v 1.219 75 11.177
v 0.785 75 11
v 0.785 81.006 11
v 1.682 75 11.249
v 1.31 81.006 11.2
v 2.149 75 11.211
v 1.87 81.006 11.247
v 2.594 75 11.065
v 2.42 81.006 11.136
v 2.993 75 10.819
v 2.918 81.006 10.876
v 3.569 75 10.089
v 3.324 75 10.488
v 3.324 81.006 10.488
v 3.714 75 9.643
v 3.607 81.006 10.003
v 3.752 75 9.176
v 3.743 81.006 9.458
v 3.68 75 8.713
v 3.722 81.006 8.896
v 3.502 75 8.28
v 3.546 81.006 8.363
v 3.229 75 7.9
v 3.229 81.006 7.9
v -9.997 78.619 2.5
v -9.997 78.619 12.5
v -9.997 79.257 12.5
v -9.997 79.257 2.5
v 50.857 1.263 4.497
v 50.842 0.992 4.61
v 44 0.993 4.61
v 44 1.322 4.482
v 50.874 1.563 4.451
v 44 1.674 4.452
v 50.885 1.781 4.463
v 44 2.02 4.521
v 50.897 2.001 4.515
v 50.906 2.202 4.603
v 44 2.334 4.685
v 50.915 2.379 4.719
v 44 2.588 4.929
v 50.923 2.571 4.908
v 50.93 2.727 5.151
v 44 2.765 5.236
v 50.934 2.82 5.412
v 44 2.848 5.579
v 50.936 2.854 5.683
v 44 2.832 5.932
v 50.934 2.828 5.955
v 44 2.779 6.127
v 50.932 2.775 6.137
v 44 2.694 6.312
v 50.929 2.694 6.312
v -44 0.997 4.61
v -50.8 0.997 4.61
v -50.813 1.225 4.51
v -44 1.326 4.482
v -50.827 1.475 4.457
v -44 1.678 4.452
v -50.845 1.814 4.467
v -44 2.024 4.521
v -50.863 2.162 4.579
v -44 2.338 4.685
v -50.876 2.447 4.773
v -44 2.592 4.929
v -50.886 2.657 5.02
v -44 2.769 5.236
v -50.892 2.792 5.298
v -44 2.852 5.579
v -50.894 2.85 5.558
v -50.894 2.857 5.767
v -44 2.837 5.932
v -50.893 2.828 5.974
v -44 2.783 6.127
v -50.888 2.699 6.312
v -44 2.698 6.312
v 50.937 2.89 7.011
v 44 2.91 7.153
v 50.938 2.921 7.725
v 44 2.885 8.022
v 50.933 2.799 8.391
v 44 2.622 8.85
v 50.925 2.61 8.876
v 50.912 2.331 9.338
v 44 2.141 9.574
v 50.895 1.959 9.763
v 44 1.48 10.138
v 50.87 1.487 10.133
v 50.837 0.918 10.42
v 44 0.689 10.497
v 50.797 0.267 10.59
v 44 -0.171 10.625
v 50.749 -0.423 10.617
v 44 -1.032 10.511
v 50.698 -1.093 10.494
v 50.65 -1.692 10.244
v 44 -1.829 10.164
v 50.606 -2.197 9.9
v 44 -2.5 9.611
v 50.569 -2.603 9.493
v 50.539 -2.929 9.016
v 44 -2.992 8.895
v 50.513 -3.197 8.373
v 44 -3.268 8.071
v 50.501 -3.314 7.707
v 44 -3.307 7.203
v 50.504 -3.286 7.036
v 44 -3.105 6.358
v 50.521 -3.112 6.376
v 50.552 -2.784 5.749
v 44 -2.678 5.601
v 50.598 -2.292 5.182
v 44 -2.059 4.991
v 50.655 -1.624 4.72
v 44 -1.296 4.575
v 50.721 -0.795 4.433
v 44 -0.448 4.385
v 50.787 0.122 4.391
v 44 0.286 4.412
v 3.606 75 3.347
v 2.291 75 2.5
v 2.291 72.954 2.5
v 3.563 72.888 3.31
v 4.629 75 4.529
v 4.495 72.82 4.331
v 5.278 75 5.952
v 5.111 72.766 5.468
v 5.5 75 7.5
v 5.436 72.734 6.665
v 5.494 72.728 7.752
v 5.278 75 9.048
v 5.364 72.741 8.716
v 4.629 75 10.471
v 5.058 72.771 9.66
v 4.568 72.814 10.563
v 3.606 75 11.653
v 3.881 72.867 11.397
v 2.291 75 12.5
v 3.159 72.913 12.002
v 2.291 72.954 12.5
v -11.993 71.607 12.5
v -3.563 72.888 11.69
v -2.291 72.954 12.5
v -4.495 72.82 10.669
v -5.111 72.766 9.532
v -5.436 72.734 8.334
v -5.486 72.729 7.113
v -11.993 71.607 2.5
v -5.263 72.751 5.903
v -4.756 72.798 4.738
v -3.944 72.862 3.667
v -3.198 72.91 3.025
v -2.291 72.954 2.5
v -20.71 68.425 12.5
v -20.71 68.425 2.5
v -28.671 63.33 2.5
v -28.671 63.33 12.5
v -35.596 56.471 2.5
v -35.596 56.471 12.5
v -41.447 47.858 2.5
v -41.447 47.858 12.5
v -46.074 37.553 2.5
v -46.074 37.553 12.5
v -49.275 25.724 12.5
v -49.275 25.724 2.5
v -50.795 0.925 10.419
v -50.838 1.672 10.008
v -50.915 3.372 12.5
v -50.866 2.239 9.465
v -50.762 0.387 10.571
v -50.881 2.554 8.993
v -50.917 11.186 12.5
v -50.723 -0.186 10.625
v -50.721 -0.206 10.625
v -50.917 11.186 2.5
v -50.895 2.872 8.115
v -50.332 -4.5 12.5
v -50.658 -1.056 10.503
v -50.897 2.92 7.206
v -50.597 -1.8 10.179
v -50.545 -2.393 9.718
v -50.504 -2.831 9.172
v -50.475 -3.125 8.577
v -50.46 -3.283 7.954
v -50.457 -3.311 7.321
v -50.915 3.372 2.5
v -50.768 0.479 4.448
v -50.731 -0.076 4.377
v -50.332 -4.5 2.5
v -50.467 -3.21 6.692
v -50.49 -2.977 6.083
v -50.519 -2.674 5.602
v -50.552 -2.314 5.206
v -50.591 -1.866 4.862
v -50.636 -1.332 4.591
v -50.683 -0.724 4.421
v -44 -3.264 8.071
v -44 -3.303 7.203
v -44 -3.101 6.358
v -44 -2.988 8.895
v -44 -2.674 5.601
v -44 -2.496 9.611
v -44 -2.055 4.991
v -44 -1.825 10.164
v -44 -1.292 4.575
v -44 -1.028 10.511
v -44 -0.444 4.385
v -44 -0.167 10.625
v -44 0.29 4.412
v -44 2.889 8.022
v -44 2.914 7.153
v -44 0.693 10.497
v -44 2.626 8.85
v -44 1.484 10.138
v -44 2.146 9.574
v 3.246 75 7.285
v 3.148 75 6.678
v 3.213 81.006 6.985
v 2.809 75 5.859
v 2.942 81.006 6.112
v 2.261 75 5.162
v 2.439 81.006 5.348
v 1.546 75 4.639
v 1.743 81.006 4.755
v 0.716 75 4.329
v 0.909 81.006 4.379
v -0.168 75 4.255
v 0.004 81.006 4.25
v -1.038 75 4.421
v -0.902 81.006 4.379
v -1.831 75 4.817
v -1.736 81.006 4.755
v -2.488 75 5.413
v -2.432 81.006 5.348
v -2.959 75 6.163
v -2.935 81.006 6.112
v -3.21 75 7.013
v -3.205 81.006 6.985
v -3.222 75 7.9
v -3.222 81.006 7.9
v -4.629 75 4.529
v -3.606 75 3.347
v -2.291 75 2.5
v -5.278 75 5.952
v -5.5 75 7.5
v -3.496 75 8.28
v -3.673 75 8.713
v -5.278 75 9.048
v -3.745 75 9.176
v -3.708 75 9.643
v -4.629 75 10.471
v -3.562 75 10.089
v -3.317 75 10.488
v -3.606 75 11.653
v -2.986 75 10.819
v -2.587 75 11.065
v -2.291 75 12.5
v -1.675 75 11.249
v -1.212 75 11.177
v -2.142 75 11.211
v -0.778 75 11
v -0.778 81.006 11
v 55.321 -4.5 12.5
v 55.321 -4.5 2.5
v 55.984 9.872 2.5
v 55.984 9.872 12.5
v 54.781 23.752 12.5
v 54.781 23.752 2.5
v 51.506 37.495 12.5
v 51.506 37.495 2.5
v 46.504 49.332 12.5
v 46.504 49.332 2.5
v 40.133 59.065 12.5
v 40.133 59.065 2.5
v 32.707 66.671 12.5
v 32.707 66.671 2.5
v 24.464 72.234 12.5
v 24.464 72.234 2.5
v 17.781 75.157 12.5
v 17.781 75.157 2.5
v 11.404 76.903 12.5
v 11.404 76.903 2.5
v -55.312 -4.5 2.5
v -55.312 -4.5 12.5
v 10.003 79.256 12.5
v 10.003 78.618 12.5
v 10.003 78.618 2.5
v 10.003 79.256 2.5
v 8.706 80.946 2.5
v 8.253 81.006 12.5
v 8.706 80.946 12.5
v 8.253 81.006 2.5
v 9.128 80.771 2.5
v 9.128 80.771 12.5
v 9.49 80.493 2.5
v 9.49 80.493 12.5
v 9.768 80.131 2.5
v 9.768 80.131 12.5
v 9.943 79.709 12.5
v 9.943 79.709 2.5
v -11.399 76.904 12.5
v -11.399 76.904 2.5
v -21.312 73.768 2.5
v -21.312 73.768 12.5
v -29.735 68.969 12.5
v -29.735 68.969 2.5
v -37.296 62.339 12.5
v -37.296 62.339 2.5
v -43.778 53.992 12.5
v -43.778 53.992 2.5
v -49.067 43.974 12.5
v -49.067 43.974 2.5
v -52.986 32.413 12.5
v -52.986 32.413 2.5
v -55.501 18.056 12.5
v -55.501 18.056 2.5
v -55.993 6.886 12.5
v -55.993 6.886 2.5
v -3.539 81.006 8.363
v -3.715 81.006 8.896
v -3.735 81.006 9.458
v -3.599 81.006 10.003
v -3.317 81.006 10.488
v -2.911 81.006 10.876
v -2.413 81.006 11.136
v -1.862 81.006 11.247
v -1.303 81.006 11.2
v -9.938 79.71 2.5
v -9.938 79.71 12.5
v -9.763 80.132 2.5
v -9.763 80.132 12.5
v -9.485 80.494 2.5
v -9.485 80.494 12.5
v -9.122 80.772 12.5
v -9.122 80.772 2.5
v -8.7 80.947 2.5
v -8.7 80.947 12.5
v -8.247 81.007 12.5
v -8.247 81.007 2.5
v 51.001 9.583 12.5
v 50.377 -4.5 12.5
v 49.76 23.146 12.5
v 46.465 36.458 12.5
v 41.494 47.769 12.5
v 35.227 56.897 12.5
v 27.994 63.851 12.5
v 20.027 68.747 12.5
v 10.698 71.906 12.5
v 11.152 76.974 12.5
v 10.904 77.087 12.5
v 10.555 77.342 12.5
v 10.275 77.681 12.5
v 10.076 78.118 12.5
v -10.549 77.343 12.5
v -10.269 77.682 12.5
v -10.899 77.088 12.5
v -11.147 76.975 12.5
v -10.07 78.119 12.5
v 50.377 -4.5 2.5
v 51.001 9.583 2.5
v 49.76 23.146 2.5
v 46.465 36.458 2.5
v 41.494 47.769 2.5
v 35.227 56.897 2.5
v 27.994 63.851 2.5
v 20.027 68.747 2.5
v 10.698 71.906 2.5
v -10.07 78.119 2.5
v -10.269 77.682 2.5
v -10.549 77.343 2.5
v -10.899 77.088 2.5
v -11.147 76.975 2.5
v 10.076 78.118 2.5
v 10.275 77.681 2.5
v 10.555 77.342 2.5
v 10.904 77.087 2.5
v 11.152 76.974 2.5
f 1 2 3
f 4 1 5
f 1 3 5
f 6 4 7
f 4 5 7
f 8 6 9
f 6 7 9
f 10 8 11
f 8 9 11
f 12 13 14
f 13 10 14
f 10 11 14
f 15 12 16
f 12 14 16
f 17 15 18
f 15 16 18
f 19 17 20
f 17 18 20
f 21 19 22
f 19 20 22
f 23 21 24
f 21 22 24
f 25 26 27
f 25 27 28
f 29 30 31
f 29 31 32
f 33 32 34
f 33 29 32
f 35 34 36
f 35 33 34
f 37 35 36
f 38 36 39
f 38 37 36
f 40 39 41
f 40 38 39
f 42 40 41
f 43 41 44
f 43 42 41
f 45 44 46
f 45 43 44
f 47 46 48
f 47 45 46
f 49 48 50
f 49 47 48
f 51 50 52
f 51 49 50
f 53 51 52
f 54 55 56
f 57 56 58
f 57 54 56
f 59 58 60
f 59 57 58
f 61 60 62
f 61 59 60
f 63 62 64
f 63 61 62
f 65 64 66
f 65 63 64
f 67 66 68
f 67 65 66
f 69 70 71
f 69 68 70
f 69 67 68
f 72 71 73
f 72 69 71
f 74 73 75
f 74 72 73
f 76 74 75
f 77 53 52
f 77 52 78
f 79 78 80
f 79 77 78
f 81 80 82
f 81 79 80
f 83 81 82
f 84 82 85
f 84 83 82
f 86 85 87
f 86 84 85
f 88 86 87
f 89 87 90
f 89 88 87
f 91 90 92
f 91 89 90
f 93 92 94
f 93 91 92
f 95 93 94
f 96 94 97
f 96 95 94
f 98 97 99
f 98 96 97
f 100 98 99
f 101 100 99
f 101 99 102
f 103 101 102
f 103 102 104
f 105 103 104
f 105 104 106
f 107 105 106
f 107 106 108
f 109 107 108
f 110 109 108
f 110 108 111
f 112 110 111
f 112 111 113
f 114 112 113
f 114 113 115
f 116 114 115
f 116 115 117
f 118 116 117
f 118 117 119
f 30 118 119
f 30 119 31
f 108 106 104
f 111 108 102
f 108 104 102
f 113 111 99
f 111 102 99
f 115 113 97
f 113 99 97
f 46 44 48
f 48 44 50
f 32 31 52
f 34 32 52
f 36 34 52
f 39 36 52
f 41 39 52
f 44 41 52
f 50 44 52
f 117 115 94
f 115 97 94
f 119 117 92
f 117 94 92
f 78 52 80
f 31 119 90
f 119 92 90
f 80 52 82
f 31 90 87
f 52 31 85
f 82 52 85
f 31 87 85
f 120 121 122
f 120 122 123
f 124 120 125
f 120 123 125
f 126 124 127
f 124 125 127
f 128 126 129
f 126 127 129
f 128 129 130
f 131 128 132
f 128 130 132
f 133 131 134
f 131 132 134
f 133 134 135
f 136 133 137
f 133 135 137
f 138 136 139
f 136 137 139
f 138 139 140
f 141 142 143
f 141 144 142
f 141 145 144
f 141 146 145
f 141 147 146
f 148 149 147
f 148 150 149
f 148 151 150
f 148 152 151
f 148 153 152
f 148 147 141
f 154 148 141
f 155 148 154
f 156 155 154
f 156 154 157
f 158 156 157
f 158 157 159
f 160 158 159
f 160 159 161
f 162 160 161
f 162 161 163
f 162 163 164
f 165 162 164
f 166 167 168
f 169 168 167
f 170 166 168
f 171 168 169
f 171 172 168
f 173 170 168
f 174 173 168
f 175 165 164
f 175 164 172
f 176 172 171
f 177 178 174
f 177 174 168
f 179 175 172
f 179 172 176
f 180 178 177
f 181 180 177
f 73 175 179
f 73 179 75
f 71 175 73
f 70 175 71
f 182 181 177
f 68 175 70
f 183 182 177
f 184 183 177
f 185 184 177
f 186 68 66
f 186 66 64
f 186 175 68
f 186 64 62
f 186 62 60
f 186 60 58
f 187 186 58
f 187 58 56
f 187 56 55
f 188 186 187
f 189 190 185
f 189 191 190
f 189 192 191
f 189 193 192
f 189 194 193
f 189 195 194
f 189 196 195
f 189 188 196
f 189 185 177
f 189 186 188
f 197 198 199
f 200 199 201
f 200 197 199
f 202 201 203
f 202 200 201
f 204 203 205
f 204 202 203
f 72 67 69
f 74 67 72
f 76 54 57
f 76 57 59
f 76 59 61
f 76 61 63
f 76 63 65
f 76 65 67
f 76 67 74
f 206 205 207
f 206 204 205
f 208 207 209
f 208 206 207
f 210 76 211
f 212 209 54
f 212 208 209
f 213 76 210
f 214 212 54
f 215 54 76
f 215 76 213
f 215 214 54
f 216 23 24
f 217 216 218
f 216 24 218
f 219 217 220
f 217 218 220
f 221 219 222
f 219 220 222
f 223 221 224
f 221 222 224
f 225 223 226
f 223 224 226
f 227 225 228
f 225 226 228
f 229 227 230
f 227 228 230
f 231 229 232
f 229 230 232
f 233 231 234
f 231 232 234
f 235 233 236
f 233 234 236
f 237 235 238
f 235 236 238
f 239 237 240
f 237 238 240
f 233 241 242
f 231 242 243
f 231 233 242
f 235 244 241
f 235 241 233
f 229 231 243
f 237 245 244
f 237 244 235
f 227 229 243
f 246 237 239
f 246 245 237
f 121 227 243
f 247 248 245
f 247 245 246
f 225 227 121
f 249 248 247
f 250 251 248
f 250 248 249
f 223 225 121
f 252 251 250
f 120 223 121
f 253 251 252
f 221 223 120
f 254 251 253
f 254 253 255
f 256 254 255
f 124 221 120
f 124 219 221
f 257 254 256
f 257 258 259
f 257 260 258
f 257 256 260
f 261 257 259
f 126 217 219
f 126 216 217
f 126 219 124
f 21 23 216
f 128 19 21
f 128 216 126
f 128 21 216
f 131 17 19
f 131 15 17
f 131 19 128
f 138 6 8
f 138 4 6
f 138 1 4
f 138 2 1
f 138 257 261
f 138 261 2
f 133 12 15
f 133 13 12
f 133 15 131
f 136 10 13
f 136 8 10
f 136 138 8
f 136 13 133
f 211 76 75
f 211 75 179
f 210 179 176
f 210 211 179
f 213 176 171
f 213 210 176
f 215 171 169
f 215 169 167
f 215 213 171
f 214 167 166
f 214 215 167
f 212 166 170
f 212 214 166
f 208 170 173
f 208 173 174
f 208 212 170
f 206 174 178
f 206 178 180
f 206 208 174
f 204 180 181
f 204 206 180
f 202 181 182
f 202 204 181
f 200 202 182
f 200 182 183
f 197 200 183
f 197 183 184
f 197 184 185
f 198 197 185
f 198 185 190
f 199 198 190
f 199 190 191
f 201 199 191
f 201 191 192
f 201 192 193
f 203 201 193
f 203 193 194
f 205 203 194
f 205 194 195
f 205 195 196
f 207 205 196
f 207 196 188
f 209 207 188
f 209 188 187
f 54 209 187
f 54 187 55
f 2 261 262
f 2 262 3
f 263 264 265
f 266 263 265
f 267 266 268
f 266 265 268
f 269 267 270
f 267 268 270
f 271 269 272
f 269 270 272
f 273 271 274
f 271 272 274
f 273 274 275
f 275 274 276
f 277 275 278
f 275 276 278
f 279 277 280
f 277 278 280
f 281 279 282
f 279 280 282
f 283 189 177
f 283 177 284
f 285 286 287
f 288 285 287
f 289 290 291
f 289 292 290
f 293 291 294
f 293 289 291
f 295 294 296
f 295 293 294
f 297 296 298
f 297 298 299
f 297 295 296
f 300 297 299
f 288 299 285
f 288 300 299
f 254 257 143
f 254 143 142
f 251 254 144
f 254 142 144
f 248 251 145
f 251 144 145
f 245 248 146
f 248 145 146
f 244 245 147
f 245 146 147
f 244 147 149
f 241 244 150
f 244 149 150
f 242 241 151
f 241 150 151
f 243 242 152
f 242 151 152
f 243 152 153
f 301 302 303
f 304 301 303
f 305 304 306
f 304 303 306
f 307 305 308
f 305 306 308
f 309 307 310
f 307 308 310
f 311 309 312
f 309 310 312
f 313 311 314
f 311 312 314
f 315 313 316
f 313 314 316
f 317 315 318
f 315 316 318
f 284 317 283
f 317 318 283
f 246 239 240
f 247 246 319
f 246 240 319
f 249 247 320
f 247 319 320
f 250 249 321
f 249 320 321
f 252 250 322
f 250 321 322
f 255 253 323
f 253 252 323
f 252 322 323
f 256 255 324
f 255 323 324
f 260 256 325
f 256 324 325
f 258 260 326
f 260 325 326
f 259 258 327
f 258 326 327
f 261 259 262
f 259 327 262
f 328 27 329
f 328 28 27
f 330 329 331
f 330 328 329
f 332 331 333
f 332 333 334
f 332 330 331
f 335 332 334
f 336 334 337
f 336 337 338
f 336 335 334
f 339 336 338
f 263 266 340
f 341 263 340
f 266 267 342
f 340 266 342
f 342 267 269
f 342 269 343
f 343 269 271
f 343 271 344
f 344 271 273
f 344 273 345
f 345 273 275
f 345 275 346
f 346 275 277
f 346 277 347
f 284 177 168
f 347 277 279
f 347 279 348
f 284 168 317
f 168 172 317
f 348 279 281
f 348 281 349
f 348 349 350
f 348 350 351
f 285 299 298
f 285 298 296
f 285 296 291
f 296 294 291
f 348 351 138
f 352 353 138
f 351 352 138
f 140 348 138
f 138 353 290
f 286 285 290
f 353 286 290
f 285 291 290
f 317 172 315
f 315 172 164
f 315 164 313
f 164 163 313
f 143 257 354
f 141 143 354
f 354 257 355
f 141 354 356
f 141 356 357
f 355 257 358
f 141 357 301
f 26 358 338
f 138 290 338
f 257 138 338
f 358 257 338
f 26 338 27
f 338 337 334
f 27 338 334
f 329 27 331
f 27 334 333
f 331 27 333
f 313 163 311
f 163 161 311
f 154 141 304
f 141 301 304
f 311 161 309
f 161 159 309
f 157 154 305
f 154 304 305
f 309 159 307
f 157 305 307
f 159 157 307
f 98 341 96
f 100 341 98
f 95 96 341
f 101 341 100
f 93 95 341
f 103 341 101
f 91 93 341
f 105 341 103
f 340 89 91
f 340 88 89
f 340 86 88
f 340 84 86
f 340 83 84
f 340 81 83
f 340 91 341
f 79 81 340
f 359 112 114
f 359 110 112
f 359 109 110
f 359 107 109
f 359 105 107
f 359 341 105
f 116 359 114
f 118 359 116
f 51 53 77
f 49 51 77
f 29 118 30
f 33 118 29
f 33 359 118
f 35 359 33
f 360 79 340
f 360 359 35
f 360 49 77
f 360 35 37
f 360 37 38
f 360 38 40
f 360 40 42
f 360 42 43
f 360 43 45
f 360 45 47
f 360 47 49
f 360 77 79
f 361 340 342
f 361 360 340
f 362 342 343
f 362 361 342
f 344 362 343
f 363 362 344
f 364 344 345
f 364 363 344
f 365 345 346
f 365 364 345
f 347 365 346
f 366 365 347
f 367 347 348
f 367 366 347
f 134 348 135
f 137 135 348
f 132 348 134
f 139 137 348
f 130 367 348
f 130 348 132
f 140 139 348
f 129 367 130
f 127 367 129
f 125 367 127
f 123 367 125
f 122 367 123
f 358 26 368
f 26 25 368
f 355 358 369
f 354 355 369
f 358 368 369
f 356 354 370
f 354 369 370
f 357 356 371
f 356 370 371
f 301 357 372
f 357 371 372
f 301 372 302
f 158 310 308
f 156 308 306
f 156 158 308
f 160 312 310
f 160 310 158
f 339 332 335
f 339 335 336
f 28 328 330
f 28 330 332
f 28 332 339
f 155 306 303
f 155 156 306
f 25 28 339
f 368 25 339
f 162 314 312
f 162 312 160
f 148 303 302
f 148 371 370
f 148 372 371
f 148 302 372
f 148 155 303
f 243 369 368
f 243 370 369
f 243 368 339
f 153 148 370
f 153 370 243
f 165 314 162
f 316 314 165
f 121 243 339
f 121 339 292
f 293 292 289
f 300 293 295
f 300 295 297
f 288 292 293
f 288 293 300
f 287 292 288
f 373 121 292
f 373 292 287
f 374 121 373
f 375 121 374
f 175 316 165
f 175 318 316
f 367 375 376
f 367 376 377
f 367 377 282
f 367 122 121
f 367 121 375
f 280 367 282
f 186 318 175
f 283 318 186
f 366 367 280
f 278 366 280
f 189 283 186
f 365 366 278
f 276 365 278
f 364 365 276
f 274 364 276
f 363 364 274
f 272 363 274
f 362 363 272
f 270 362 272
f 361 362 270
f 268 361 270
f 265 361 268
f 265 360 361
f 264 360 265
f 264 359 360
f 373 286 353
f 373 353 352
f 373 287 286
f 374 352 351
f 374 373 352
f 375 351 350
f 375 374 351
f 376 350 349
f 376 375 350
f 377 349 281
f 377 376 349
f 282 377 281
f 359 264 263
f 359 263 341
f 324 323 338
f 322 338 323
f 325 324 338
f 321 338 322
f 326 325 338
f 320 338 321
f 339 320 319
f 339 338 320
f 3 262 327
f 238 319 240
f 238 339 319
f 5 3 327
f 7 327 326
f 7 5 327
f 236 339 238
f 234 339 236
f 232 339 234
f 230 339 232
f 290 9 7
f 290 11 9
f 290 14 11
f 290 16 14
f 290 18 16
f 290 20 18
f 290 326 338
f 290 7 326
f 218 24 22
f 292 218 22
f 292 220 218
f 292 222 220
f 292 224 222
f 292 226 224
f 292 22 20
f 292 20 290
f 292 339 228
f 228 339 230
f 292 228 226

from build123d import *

# Parameters (mm, degrees)
PAD005_DEPTH    = 10
SKETCH015_R     = 3.125
SKETCH015_R_2   = 1.25
PAD006_DEPTH    = 110
SKETCH016_W     = 88
SKETCH016_H     = 11
POCKET006_DEPTH = 10.001
SKETCH017_W     = 20
SKETCH017_H     = 10
PAD007_DEPTH    = 5
POCKET007_DEPTH = 85.509727
SKETCH019_R     = 5.5
POCKET008_DEPTH = 75
FILLET_R        = 1.75


with BuildPart() as part:
    # Sketch014 → Pad005 (new body)
    with BuildSketch(Plane.XY):
        with BuildLine():
            Line((55.320782, -4.5), (50.377184, -4.5))
            add(Edge.make_bspline(
                [(50.377184, -4.5), (53.986589, 28.285571), (45.809605, 54.91681), (30.437237, 68.919253), (14.05506, 72.999995), (2.4e-05, 73), (-14.058167, 73.000005), (-30.444405, 68.917468), (-45.797003, 54.963624), (-53.960317, 28.337681), (-50.332268, -4.5)],
                knots=[0.459879, 0.459879, 0.459879, 0.459879, 0.459879, 0.459879, 1, 1, 1, 1, 1, 1.540216, 1.540216, 1.540216, 1.540216, 1.540216, 1.540216], degree=5, weights=[1.511377, 1.459145, 1.581492, 1.878748, 2.351855, 3, 2.351741, 1.878582, 1.580192, 1.456955, 1.509005]))
            Line((-50.332268, -4.5), (-55.312029, -4.5))
            add(Edge.make_bspline(
                [(55.320782, -4.5), (59.190875, 30.481044), (50.18289, 58.805264), (33.344109, 73.658439), (15.399277, 77.999995), (2.5e-05, 78), (-15.399851, 78.000005), (-33.345502, 73.658102), (-50.180453, 58.814098), (-59.185767, 30.490915), (-55.312029, -4.5)],
                knots=[0.460805, 0.460805, 0.460805, 0.460805, 0.460805, 0.460805, 1, 1, 1, 1, 1, 1.539212, 1.539212, 1.539212, 1.539212, 1.539212, 1.539212], degree=5, weights=[1.509472, 1.458717, 1.582334, 1.880371, 2.352966, 3, 2.352945, 1.88034, 1.582103, 1.458328, 1.50905]))
        make_face()
    extrude(amount=PAD005_DEPTH)

    # Sketch015 (on DatumPlane) → Pad006 (join)
    with BuildSketch(Plane(origin=(55.001235, 46.003648, 5), x_dir=(0, 0, -1), z_dir=(1, -4.6e-05, 0))):
        with Locations((0, -46.2)):
            Circle(SKETCH015_R)
        with Locations((1.8, -44.4)):
            Circle(SKETCH015_R_2)
    extrude(amount=-PAD006_DEPTH)

    # Sketch016 (on Face5 of Pad006) → Pocket006 (cut, through all)
    with BuildSketch(Plane.XY.offset(10)):
        Rectangle(SKETCH016_W, SKETCH016_H)
    extrude(amount=-POCKET006_DEPTH, mode=Mode.SUBTRACT)

    # Sketch017 (on DatumPlane) → Pad007 (join)
    with BuildSketch(Plane(origin=(0.002608, 76.006164, 5), x_dir=(1, -4.6e-05, 0), z_dir=(4.6e-05, 1, 0))):
        Rectangle(SKETCH017_W, SKETCH017_H)
    extrude(amount=PAD007_DEPTH)

    # Sketch018 (on Face14 of Pad007) → Pocket007 (cut, through all)
    with BuildSketch(Plane(origin=(0.003707, 81.006164, 10), x_dir=(1, -4.6e-05, 0), z_dir=(4.6e-05, 1, 0))):
        with BuildLine():
            ThreePointArc((-3.225332, 4.600332), (-3.320764, 2.011977), (-0.781754, 1.5))
            Line((-0.781754, 1.5), (0.781754, 1.5))
            ThreePointArc((0.781754, 1.5), (3.320764, 2.011977), (3.225332, 4.600332))
            ThreePointArc((3.225332, 4.600332), (0, 8.25), (-3.225332, 4.600332))
        make_face()
    extrude(amount=-POCKET007_DEPTH, mode=Mode.SUBTRACT)

    # Sketch019 → Pocket008 (cut)
    with BuildSketch(Plane.XZ):
        with Locations((0, 5)):
            Circle(SKETCH019_R)
    extrude(amount=-POCKET008_DEPTH, mode=Mode.SUBTRACT)

    # Fillet
    fillet_edges = [part.edges().sort_by_distance(p)[0] for p in [
        (10.002837, 81.005707, 4.999997),
        (10.002661, 77.167792, 4.999997),
        (-9.997339, 77.168929, 5.000003),
        (-9.997163, 81.006622, 5.000003),
    ]]
    fillet(fillet_edges, radius=FILLET_R)


with BuildPart() as part_1:
    # Body004 placement: moved
    add(part.part.moved(Location((0, 0, 2.5))))


solid = part_1.part
